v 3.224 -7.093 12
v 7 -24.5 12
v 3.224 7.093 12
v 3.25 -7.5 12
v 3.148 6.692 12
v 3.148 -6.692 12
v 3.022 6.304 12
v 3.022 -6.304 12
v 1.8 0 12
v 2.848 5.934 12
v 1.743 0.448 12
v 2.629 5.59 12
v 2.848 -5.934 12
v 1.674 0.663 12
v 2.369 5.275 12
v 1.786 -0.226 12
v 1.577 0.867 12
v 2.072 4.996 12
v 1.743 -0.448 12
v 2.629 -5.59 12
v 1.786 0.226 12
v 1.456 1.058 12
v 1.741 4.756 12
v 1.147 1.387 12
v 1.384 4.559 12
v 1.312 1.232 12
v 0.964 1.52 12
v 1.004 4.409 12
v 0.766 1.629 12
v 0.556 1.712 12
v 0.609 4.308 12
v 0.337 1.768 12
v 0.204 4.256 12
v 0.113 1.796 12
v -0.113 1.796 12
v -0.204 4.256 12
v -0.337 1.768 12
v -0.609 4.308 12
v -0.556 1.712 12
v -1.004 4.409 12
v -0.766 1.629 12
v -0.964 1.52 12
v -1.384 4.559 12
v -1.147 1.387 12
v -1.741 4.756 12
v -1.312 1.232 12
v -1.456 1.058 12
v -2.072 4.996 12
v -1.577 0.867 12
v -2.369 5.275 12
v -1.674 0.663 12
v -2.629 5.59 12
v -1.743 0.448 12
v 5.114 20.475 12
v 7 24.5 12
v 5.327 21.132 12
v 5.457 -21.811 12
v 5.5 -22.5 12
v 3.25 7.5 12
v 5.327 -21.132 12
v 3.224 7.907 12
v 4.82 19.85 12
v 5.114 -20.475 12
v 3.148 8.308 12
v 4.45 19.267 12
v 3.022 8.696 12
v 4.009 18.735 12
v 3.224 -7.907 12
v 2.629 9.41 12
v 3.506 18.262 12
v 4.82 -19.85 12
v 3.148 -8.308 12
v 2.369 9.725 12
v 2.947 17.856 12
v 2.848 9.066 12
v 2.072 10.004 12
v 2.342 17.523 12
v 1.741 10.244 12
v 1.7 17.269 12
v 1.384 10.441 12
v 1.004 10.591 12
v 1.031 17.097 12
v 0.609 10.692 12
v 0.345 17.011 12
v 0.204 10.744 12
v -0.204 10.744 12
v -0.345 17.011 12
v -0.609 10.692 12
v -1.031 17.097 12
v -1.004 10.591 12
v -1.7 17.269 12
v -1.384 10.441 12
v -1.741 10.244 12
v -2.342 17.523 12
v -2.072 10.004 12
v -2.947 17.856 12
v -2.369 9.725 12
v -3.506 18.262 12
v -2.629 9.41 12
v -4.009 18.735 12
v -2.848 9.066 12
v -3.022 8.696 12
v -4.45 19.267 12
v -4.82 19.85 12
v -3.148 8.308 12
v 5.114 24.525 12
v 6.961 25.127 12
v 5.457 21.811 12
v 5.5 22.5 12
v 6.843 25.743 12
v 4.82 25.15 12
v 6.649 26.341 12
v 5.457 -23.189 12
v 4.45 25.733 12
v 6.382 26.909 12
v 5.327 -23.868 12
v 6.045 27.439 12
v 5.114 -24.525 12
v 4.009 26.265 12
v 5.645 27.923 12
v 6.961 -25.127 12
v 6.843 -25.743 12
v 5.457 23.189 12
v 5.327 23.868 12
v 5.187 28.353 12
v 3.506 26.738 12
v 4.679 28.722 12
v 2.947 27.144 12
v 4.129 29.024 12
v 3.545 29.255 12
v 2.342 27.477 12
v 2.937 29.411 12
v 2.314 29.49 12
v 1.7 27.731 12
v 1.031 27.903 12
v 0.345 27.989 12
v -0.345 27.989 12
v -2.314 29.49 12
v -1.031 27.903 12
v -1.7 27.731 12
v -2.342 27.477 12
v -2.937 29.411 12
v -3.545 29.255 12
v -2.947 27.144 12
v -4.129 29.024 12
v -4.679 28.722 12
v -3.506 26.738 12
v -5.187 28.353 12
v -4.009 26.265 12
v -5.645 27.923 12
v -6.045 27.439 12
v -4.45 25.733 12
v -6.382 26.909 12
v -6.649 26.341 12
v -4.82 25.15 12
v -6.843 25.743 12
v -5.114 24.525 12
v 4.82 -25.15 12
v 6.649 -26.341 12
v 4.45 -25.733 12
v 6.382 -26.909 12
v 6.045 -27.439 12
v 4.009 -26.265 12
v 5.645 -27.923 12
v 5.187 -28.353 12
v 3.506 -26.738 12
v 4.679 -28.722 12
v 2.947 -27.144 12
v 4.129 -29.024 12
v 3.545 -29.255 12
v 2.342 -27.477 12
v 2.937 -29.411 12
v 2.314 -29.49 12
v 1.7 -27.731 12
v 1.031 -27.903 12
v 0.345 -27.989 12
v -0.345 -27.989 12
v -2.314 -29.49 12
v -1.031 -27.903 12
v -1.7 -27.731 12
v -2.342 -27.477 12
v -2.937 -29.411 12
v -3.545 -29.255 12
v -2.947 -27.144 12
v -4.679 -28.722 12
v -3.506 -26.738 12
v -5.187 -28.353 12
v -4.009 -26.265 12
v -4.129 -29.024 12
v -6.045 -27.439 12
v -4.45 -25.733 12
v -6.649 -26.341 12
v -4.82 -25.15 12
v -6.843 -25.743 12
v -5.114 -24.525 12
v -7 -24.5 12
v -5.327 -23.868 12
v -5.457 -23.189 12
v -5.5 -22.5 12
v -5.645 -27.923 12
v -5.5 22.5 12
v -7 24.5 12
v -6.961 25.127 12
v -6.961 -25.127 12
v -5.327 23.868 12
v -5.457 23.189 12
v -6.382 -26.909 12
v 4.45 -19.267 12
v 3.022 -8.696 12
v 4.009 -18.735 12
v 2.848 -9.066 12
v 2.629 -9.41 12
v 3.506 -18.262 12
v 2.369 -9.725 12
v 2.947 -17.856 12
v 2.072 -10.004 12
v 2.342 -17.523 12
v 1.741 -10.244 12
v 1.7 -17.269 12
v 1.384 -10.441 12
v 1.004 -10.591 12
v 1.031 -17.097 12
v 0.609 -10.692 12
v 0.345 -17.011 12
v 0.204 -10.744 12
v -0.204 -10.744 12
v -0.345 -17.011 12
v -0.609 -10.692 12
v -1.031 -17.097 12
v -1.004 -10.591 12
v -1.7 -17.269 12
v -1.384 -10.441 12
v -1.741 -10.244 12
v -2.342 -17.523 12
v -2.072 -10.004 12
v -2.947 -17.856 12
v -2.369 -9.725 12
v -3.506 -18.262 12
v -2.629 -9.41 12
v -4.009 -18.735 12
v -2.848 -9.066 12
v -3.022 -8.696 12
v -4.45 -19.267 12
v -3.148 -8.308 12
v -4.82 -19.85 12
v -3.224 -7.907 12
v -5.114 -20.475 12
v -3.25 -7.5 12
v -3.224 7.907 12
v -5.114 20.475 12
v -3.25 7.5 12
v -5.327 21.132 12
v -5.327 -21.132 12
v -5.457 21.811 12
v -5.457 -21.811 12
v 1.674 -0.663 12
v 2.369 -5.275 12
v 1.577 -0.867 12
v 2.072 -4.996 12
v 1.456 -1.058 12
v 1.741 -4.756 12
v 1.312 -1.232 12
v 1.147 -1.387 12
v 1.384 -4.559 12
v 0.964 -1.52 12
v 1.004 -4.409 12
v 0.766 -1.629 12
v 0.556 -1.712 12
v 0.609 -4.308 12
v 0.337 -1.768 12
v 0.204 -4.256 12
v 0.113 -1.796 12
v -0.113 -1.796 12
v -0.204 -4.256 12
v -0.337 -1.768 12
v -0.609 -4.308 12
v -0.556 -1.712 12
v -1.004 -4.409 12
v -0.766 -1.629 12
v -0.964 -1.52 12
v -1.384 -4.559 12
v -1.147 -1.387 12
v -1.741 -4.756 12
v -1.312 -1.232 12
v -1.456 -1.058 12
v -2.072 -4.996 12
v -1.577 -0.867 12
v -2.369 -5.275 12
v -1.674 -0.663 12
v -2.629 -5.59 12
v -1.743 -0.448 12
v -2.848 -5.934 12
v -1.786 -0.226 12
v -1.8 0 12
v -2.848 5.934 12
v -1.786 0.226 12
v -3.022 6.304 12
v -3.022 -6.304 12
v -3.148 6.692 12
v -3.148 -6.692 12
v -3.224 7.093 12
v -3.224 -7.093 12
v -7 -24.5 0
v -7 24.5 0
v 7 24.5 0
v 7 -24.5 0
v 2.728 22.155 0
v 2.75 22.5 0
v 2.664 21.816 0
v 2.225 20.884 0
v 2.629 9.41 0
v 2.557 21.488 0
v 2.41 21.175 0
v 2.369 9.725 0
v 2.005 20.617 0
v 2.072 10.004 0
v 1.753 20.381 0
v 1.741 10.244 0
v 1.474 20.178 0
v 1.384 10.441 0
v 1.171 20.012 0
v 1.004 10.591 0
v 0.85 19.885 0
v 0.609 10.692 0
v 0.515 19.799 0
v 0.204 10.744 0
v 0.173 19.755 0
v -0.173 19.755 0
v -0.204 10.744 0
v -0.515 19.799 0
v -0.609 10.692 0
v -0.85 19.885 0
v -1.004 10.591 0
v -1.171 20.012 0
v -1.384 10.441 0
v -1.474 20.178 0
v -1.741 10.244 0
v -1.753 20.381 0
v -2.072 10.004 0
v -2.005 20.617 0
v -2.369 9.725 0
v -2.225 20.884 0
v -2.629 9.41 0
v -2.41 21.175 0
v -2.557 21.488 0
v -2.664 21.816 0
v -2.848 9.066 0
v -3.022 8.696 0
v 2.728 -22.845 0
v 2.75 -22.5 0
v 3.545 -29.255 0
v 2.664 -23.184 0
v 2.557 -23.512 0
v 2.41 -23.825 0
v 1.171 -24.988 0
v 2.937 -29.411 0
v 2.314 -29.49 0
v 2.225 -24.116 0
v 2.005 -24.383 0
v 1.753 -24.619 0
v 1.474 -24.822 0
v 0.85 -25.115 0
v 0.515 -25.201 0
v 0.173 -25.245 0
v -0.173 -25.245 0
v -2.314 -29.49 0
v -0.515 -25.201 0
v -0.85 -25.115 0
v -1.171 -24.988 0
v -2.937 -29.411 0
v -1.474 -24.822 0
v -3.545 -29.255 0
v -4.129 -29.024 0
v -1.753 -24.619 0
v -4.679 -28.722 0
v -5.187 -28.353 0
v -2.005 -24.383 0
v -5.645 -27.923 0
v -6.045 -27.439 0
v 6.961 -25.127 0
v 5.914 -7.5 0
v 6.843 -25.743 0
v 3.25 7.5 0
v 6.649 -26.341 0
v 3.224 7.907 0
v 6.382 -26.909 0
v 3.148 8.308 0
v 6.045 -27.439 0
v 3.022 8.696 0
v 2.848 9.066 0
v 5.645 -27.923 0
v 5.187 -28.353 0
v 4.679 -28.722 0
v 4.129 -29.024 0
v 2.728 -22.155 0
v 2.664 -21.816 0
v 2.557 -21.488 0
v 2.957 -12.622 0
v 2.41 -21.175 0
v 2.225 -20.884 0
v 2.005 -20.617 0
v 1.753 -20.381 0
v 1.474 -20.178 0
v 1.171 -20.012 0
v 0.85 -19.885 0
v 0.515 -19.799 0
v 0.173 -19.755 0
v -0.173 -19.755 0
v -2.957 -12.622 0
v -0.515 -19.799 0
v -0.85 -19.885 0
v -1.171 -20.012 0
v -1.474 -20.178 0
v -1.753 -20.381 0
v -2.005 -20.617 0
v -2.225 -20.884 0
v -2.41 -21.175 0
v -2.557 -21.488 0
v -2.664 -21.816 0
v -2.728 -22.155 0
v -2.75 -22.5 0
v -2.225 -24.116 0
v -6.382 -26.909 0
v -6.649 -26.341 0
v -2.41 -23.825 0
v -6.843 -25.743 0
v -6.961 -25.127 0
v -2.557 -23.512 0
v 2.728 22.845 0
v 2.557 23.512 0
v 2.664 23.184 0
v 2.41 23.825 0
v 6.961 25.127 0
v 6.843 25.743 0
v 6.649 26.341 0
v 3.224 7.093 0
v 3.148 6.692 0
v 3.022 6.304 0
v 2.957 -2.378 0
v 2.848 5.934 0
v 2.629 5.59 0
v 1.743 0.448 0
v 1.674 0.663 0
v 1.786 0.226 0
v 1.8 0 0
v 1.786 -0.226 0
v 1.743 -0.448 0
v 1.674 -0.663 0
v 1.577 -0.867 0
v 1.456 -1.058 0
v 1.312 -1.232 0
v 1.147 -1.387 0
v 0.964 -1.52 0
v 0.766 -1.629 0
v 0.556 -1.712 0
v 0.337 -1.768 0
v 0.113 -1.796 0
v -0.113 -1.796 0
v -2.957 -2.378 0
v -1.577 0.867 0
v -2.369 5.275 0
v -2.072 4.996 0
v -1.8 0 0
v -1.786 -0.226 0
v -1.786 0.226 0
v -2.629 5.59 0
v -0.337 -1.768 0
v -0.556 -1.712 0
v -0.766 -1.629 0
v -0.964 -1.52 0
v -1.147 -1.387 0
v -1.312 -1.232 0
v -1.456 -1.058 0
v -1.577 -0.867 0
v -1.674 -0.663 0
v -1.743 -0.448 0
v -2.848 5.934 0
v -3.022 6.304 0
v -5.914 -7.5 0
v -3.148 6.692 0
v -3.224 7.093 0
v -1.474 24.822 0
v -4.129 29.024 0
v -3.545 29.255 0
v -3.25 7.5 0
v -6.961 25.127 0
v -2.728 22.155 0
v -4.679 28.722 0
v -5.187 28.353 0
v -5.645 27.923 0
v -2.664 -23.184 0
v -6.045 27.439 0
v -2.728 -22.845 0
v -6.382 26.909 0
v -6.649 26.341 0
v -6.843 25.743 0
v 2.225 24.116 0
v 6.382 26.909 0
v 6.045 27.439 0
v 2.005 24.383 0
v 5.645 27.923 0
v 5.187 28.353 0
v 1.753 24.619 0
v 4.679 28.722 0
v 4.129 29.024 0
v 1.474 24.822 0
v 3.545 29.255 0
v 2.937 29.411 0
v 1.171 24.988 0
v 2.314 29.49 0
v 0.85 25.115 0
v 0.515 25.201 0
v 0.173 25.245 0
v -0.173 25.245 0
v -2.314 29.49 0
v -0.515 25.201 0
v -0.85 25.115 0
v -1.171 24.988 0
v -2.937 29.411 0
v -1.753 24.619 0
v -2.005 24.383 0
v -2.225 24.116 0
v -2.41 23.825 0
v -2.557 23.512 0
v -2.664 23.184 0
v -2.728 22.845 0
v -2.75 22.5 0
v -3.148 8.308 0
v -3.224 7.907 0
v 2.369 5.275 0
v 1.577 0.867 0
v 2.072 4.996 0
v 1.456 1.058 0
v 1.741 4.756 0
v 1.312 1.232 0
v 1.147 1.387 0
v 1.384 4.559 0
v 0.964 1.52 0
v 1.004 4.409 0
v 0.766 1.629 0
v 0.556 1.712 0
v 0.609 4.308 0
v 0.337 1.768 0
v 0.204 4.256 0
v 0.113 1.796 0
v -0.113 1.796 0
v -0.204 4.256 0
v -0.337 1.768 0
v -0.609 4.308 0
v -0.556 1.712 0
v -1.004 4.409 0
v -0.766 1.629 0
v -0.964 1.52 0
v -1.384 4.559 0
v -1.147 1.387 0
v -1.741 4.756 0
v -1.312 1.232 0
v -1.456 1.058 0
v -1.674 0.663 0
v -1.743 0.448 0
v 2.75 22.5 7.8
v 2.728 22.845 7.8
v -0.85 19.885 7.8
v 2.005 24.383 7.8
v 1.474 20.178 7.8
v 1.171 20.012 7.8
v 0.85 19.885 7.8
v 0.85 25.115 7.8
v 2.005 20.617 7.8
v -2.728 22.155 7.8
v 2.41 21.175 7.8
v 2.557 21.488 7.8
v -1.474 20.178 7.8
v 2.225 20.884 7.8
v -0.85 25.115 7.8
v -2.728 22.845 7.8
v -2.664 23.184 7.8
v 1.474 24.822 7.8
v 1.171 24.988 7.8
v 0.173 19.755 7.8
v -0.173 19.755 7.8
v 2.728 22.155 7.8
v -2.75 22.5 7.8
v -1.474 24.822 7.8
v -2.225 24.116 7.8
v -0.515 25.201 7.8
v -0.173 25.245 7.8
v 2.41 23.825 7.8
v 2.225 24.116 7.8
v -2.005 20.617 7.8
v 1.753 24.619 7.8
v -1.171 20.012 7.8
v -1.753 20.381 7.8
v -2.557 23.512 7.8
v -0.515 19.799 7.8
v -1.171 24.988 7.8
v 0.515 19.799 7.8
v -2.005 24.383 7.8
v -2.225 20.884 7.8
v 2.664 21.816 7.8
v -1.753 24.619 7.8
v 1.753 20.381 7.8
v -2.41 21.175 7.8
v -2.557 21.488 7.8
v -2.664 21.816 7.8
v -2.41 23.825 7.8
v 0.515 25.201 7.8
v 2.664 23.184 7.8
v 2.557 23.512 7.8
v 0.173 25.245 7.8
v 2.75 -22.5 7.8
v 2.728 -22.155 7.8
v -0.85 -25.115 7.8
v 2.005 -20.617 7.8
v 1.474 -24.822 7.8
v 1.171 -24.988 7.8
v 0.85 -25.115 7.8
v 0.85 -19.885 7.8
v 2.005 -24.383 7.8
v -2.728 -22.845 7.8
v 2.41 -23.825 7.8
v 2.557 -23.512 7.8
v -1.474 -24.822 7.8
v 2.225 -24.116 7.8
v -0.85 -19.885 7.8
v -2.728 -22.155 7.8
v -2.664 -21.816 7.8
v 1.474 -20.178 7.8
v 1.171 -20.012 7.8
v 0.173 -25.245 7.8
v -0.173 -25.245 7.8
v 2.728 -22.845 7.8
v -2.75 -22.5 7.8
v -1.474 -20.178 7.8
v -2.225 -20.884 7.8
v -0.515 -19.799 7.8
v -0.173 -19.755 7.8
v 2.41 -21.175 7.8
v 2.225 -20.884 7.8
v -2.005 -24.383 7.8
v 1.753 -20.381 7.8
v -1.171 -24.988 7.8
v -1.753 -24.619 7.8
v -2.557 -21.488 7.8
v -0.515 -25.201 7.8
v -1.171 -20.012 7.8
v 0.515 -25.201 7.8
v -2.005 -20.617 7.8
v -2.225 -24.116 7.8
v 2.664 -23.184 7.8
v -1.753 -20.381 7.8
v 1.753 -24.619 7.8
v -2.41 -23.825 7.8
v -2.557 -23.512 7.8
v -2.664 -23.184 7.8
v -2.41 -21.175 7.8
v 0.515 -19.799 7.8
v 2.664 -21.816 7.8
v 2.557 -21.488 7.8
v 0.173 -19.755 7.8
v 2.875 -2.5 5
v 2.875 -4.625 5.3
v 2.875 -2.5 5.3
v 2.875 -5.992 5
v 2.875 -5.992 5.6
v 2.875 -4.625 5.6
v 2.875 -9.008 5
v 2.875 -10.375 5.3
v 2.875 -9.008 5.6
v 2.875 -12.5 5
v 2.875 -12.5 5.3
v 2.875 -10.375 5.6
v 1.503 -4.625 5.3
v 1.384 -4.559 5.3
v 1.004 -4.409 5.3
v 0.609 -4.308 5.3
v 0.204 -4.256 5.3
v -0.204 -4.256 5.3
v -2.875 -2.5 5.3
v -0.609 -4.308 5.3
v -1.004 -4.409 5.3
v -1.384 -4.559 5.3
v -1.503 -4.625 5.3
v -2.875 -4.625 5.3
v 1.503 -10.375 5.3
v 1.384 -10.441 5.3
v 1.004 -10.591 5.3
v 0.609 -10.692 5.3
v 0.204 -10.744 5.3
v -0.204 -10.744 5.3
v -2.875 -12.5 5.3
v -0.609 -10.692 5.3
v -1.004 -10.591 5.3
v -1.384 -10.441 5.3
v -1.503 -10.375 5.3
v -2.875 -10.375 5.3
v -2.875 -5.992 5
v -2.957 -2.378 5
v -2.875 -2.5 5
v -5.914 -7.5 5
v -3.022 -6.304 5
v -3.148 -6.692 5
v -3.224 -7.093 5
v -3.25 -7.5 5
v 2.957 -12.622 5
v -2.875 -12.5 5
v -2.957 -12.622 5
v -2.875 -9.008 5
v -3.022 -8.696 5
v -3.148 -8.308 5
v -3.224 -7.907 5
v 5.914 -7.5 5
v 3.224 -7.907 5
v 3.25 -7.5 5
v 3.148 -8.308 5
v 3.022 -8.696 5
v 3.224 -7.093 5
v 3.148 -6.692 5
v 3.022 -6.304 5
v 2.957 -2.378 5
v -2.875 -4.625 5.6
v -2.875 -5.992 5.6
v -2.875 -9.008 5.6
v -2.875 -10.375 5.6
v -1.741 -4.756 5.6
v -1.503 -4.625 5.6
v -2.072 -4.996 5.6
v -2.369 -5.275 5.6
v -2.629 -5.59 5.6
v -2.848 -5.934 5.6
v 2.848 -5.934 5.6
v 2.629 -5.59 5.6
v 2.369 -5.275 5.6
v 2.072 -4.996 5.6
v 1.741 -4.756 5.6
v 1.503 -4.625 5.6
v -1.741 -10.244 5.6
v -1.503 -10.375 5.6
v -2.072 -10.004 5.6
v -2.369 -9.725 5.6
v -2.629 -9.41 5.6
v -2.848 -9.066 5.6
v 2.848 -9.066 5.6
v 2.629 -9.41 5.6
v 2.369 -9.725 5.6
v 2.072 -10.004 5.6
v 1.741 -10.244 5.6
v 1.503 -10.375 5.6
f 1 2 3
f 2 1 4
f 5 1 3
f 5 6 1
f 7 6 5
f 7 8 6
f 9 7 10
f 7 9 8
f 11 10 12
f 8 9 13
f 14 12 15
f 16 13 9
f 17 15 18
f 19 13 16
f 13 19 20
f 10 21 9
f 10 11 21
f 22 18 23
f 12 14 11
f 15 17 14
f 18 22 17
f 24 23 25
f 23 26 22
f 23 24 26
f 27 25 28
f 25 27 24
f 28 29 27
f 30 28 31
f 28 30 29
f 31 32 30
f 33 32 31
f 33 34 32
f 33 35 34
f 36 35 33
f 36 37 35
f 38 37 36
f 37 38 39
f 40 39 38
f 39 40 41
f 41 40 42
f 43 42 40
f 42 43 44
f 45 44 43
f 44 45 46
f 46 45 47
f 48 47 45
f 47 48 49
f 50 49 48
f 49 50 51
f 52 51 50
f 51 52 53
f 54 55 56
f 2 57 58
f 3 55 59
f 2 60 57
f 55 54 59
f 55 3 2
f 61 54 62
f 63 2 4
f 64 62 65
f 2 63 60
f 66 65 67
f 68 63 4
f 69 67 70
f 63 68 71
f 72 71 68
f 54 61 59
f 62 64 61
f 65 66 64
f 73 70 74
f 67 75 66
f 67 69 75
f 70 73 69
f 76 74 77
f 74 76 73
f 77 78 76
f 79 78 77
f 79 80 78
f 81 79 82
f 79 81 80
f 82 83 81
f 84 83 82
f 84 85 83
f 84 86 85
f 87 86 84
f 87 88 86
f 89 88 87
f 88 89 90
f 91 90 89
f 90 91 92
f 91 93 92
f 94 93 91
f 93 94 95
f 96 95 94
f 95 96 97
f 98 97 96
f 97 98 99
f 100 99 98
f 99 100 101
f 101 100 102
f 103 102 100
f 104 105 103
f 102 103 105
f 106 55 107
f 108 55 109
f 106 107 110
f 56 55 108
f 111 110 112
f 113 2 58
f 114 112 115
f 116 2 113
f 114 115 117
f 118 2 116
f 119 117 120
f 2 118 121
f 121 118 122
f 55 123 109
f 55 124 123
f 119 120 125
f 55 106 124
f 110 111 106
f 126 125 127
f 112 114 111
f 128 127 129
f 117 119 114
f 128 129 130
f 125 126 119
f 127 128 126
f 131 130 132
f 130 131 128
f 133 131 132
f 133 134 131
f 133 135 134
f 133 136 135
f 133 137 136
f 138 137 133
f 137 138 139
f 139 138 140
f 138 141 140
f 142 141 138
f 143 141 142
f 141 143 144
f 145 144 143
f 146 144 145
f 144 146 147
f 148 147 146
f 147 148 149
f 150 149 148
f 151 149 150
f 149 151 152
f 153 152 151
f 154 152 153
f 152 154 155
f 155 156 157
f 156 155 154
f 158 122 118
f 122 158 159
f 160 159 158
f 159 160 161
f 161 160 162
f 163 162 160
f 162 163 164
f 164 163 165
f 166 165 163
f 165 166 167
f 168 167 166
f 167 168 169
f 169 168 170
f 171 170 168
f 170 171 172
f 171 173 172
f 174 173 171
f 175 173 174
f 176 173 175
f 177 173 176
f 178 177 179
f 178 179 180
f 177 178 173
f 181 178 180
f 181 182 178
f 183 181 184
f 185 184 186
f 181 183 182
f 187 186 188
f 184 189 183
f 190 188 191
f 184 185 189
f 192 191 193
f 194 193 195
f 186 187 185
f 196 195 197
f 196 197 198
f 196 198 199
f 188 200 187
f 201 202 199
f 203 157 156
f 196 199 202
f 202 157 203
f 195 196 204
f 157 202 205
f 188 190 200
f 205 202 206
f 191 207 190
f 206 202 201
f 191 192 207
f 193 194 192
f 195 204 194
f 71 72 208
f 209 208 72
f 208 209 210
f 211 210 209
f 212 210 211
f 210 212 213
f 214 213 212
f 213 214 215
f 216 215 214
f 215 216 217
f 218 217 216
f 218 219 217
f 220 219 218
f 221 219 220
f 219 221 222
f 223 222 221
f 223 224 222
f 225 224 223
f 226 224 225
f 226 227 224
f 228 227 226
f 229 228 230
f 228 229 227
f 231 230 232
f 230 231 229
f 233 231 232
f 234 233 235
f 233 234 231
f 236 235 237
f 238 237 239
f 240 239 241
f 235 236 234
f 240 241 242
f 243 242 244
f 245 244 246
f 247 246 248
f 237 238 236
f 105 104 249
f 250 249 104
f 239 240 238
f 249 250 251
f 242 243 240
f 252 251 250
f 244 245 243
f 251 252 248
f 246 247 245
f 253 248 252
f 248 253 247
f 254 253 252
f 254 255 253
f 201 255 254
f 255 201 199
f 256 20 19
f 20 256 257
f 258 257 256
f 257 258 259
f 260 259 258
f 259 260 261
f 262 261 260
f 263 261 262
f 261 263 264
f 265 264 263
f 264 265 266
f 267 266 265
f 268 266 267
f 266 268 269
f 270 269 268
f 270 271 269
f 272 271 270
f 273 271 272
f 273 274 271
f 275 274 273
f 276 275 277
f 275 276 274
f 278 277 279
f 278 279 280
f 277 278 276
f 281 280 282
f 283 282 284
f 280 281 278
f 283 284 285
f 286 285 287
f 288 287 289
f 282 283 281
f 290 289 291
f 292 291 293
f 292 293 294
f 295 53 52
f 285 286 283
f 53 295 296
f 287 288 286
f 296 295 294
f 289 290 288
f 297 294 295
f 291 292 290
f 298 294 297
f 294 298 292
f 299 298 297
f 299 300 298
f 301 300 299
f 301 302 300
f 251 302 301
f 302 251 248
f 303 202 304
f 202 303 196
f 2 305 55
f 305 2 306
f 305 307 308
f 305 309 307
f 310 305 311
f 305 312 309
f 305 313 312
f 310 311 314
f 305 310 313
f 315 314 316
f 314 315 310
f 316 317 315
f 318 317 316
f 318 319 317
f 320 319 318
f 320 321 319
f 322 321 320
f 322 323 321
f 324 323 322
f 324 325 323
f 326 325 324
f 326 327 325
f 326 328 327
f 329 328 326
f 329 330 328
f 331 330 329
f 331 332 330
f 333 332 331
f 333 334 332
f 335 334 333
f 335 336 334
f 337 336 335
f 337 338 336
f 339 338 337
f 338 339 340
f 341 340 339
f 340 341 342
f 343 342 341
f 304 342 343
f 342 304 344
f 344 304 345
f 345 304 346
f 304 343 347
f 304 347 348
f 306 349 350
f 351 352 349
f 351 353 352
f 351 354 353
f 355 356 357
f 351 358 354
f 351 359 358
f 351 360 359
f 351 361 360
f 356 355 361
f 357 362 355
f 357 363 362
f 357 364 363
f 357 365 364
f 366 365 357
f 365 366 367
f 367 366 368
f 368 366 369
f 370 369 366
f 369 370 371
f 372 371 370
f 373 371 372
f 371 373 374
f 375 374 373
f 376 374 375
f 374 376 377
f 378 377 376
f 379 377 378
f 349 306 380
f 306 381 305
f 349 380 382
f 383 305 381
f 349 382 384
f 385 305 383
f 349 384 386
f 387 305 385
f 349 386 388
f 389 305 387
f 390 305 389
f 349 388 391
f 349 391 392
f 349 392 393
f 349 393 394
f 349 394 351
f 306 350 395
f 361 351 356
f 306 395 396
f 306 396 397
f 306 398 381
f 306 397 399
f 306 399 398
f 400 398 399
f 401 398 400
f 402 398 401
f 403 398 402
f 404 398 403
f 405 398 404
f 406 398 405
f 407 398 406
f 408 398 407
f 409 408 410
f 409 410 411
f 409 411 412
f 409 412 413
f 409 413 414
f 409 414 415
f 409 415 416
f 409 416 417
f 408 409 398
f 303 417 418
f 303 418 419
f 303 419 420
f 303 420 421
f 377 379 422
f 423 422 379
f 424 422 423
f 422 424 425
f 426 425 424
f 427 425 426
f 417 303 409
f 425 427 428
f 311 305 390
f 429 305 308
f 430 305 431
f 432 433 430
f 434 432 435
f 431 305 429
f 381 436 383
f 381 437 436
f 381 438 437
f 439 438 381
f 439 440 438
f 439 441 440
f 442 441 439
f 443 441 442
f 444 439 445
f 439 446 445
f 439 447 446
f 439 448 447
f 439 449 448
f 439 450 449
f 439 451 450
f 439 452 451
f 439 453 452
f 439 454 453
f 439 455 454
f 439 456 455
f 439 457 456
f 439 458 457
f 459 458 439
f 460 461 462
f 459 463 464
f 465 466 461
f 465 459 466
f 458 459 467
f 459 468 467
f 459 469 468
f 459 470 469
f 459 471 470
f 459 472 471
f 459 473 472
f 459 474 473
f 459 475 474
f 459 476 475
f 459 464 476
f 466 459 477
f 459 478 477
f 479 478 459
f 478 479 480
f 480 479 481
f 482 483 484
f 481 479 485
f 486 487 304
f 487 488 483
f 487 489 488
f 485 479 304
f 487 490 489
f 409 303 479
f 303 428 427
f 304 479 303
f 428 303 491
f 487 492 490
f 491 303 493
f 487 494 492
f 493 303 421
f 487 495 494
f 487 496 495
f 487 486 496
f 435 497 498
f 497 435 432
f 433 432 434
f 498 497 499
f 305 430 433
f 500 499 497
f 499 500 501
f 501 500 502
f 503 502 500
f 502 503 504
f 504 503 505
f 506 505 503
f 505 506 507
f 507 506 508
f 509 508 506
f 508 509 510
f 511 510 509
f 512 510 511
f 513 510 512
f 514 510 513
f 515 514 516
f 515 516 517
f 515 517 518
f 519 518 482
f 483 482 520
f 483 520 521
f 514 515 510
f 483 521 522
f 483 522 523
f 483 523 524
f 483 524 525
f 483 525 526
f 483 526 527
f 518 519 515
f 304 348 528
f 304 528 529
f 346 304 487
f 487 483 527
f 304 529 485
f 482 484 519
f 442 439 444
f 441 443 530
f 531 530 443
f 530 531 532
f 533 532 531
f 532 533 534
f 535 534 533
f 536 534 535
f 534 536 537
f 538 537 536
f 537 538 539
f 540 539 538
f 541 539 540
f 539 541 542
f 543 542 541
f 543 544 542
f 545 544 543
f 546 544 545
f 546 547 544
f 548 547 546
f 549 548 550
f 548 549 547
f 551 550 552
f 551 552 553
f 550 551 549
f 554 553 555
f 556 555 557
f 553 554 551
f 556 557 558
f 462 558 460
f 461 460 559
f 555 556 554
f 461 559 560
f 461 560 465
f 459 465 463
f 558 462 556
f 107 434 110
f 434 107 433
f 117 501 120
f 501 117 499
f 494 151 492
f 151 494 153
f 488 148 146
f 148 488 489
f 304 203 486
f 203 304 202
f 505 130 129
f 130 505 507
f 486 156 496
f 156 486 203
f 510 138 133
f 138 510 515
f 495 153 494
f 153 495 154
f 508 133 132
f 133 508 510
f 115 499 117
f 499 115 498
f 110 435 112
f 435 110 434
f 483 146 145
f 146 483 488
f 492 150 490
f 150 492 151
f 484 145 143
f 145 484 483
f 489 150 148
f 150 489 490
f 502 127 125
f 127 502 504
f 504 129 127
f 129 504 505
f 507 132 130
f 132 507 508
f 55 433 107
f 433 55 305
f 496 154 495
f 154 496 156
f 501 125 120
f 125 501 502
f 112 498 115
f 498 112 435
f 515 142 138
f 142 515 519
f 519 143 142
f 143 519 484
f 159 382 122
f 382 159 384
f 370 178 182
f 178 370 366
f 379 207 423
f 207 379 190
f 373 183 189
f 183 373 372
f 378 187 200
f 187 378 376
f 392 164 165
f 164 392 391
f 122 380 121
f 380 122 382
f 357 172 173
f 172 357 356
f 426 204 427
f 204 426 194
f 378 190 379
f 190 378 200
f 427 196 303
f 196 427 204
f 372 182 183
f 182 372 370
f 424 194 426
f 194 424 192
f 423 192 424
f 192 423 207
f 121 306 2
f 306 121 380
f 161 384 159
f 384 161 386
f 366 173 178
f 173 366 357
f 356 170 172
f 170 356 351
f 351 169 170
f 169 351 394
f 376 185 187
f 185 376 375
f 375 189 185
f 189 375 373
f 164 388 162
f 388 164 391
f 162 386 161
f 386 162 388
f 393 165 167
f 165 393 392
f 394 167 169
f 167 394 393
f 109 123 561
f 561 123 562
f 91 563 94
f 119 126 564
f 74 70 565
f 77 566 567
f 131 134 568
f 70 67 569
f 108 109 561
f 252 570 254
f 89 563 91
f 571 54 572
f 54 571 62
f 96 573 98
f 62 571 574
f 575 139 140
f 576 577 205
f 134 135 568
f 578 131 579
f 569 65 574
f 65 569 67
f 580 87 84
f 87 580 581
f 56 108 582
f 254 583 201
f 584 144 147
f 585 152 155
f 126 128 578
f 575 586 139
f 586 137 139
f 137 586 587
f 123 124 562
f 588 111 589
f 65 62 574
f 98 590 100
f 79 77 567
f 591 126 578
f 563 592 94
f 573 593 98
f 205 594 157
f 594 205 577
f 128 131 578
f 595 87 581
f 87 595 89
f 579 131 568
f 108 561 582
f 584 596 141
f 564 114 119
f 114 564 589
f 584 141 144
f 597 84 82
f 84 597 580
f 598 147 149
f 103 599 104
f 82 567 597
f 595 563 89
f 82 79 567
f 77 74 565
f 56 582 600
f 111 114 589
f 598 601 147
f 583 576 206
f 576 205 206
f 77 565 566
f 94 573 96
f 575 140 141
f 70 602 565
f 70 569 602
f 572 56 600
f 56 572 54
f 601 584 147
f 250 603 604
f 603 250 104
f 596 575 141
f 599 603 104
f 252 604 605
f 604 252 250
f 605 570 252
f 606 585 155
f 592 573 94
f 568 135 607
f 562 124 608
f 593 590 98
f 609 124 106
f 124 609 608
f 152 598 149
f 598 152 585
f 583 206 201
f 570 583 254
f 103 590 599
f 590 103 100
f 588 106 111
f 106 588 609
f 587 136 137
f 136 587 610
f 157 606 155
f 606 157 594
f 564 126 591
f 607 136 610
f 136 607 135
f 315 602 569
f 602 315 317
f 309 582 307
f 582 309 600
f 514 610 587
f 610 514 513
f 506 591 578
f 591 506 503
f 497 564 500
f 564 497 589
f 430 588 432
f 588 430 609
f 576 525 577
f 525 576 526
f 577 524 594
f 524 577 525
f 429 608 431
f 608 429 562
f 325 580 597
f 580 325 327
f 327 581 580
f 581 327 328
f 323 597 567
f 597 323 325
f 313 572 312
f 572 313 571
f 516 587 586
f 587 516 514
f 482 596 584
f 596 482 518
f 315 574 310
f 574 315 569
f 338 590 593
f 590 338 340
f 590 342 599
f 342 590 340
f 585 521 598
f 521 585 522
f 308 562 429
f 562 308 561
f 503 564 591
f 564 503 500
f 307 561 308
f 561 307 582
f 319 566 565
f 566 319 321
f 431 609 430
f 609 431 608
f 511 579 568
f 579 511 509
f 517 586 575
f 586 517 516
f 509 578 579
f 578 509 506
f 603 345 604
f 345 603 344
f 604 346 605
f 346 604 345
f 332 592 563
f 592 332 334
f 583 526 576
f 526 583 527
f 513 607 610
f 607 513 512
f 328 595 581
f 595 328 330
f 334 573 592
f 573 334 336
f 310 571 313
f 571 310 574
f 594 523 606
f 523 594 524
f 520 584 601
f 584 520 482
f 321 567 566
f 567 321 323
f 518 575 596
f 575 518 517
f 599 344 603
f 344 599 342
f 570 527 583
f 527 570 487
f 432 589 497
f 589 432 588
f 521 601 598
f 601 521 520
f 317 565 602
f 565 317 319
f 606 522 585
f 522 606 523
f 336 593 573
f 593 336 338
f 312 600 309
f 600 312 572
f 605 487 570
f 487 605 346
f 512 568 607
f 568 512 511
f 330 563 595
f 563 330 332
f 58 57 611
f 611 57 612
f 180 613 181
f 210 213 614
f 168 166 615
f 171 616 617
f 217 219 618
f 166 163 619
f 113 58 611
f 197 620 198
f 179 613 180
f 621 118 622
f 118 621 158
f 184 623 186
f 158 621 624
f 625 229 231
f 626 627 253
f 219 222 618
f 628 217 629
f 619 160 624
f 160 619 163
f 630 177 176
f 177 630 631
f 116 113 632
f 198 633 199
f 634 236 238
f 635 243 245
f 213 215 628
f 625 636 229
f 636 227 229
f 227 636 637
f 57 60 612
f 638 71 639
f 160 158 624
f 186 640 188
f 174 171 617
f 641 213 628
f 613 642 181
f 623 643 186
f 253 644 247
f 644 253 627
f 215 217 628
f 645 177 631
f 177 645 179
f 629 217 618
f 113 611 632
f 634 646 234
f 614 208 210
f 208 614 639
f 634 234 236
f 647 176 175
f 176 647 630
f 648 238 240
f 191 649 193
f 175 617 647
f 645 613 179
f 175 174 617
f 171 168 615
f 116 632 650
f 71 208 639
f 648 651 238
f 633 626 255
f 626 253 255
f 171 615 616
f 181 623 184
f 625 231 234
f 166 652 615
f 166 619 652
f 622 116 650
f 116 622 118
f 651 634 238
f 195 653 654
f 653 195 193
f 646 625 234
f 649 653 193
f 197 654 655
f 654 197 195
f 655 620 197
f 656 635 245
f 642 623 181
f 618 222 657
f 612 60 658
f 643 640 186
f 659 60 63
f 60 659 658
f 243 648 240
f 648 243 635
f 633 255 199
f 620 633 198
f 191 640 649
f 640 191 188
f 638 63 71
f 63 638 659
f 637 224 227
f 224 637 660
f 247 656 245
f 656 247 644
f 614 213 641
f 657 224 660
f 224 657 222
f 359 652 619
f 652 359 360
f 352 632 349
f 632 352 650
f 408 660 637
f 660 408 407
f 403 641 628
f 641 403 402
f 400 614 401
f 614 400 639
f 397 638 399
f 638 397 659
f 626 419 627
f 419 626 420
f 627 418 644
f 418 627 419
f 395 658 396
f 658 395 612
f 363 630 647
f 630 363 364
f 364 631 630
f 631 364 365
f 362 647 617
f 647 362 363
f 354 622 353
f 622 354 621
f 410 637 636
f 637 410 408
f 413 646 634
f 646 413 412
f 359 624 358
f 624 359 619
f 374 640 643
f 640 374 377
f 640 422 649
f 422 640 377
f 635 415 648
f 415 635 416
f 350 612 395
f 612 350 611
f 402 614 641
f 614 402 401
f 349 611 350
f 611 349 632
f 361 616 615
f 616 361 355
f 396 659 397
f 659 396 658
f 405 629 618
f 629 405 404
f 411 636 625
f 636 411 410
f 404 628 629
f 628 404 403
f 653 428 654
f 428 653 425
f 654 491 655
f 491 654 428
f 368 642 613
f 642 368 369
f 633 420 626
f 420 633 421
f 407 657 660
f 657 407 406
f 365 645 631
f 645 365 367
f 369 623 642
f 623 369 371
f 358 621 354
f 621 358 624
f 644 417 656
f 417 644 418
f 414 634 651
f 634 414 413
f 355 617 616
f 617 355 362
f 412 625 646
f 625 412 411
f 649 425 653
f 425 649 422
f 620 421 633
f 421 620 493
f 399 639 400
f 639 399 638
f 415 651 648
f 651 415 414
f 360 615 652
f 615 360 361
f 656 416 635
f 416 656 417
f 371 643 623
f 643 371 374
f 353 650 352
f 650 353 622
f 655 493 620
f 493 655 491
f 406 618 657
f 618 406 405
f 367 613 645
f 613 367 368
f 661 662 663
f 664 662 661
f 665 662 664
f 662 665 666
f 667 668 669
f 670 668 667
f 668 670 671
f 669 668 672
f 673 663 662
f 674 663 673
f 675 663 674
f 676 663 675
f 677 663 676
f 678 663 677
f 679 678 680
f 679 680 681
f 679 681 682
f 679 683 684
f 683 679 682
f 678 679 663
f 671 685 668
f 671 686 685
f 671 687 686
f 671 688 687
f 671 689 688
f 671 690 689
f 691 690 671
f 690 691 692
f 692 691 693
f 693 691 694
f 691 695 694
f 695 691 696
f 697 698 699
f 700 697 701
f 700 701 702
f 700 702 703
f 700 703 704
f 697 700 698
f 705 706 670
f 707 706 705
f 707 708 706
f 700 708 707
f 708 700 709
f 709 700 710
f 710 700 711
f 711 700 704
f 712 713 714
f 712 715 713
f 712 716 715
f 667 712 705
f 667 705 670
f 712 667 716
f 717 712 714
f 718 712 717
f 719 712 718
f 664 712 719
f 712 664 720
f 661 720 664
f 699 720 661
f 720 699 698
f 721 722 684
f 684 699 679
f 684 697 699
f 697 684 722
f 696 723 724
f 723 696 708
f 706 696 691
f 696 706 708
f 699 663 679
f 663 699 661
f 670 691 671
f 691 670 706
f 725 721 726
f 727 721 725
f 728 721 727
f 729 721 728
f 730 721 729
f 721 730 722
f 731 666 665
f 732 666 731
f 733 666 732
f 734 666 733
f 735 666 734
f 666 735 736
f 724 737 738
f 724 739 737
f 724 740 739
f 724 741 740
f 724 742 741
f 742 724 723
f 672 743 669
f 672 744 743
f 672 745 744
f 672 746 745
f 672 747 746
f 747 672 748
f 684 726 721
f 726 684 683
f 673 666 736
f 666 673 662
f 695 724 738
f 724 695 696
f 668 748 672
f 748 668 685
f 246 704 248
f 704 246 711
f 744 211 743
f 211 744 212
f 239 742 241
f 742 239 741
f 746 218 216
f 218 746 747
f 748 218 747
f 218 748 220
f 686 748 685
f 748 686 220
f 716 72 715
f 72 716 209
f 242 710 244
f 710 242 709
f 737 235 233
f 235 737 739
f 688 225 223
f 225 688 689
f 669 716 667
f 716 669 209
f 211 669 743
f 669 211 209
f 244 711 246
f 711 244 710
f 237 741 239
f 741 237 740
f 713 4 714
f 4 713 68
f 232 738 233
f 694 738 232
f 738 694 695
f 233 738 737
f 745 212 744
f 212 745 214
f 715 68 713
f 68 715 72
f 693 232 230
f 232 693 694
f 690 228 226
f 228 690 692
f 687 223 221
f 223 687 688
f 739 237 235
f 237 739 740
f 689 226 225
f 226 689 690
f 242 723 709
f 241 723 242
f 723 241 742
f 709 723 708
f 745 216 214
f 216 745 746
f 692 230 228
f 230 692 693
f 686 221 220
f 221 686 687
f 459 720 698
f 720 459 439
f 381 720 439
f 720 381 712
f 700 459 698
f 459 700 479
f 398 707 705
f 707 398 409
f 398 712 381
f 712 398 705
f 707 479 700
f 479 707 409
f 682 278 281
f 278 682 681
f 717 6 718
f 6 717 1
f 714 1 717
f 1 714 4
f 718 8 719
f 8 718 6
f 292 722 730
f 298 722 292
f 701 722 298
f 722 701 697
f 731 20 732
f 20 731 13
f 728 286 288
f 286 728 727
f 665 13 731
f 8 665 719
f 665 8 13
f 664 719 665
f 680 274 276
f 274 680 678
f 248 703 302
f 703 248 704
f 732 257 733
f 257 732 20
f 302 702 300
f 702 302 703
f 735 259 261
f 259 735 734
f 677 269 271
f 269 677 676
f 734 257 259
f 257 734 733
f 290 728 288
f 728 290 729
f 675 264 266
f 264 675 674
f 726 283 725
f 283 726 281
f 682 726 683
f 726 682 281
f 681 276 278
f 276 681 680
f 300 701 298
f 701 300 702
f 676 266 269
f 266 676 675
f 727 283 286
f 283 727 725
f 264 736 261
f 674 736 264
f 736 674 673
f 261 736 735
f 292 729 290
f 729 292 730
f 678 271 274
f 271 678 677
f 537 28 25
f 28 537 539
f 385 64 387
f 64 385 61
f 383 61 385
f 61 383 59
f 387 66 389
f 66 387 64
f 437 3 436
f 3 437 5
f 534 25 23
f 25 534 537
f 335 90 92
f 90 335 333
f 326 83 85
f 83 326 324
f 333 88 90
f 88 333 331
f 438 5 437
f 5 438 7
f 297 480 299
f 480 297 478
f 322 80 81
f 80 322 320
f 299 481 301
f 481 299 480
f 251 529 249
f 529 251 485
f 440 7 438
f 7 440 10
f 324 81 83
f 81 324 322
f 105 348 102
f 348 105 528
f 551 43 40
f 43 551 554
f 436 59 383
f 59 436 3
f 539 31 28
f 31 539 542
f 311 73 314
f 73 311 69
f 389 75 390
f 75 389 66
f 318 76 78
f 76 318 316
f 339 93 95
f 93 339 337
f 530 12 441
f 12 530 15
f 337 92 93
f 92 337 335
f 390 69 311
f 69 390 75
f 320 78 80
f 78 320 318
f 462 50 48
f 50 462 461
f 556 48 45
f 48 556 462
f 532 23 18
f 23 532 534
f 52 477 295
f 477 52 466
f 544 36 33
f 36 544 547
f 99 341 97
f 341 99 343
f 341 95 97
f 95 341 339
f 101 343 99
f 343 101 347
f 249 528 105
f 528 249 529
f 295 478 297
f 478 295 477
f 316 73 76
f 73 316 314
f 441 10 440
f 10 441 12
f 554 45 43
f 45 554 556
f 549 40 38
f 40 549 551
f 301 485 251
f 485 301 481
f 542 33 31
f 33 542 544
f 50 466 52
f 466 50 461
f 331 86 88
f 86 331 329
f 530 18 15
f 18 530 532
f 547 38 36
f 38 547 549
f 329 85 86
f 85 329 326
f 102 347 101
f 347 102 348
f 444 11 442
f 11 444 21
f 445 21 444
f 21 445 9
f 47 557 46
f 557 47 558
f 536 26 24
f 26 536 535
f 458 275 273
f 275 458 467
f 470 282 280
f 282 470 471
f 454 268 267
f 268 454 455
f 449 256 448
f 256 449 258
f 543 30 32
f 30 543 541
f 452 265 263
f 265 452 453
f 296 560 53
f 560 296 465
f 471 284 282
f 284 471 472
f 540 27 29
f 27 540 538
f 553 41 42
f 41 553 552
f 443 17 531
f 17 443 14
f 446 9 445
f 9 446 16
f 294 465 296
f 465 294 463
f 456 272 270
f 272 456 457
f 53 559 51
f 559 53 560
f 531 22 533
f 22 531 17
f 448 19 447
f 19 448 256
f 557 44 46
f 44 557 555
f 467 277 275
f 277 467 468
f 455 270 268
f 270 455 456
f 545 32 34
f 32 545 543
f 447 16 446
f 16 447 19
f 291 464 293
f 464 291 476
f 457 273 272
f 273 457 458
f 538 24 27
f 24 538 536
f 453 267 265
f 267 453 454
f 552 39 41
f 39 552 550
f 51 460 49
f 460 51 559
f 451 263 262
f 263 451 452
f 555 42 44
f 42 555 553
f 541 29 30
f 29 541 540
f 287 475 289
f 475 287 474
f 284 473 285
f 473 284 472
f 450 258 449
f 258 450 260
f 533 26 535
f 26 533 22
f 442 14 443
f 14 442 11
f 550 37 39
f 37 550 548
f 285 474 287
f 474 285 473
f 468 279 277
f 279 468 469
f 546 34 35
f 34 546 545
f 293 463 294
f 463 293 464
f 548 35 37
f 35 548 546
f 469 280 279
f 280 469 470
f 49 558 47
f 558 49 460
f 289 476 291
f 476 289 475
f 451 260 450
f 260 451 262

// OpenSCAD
$fn = 50;


difference() {
	union() {
		hull() {
			translate(v = [-2.0000000000, 9.5000000000, 0]) {
				cylinder(h = 12, r = 5);
			}
			translate(v = [2.0000000000, 9.5000000000, 0]) {
				cylinder(h = 12, r = 5);
			}
			translate(v = [-2.0000000000, -9.5000000000, 0]) {
				cylinder(h = 12, r = 5);
			}
			translate(v = [2.0000000000, -9.5000000000, 0]) {
				cylinder(h = 12, r = 5);
			}
		}
		translate(v = [0.0000000000, 15.0000000000, 0]) {
			hull() {
				translate(v = [-2.0000000000, 9.5000000000, 0]) {
					cylinder(h = 12, r = 5);
				}
				translate(v = [2.0000000000, 9.5000000000, 0]) {
					cylinder(h = 12, r = 5);
				}
				translate(v = [-2.0000000000, -9.5000000000, 0]) {
					cylinder(h = 12, r = 5);
				}
				translate(v = [2.0000000000, -9.5000000000, 0]) {
					cylinder(h = 12, r = 5);
				}
			}
		}
		translate(v = [0.0000000000, 15.0000000000, 0]) {
			hull() {
				translate(v = [-2.0000000000, 9.5000000000, 0]) {
					cylinder(h = 12, r = 5);
				}
				translate(v = [2.0000000000, 9.5000000000, 0]) {
					cylinder(h = 12, r = 5);
				}
				translate(v = [-2.0000000000, -9.5000000000, 0]) {
					cylinder(h = 12, r = 5);
				}
				translate(v = [2.0000000000, -9.5000000000, 0]) {
					cylinder(h = 12, r = 5);
				}
			}
		}
		translate(v = [0.0000000000, -15.0000000000, 0]) {
			hull() {
				translate(v = [-2.0000000000, 9.5000000000, 0]) {
					cylinder(h = 12, r = 5);
				}
				translate(v = [2.0000000000, 9.5000000000, 0]) {
					cylinder(h = 12, r = 5);
				}
				translate(v = [-2.0000000000, -9.5000000000, 0]) {
					cylinder(h = 12, r = 5);
				}
				translate(v = [2.0000000000, -9.5000000000, 0]) {
					cylinder(h = 12, r = 5);
				}
			}
		}
		translate(v = [0.0000000000, -15.0000000000, 0]) {
			hull() {
				translate(v = [-2.0000000000, 9.5000000000, 0]) {
					cylinder(h = 12, r = 5);
				}
				translate(v = [2.0000000000, 9.5000000000, 0]) {
					cylinder(h = 12, r = 5);
				}
				translate(v = [-2.0000000000, -9.5000000000, 0]) {
					cylinder(h = 12, r = 5);
				}
				translate(v = [2.0000000000, -9.5000000000, 0]) {
					cylinder(h = 12, r = 5);
				}
			}
		}
	}
	union() {
		translate(v = [0.0000000000, 22.5000000000, 12]) {
			rotate(a = [0, 0, 0]) {
				difference() {
					union() {
						#translate(v = [0, 0, -12.0000000000]) {
							cylinder(h = 12, r = 2.2500000000);
						}
						#translate(v = [0, 0, -4.2000000000]) {
							cylinder(h = 4.2000000000, r1 = 2.7500000000, r2 = 5.5000000000);
						}
						#translate(v = [0, 0, -12.0000000000]) {
							cylinder(h = 12, r = 2.7500000000);
						}
						#translate(v = [0, 0, -12.0000000000]) {
							cylinder(h = 12, r = 2.2500000000);
						}
					}
					union();
				}
			}
		}
		translate(v = [0.0000000000, 22.5000000000, 12]) {
			rotate(a = [0, 0, 0]) {
				difference() {
					union() {
						#translate(v = [0, 0, -12.0000000000]) {
							cylinder(h = 12, r = 2.2500000000);
						}
						#translate(v = [0, 0, -4.2000000000]) {
							cylinder(h = 4.2000000000, r1 = 2.7500000000, r2 = 5.5000000000);
						}
						#translate(v = [0, 0, -12.0000000000]) {
							cylinder(h = 12, r = 2.7500000000);
						}
						#translate(v = [0, 0, -12.0000000000]) {
							cylinder(h = 12, r = 2.2500000000);
						}
					}
					union();
				}
			}
		}
		translate(v = [0.0000000000, -22.5000000000, 12]) {
			rotate(a = [0, 0, 0]) {
				difference() {
					union() {
						#translate(v = [0, 0, -12.0000000000]) {
							cylinder(h = 12, r = 2.2500000000);
						}
						#translate(v = [0, 0, -4.2000000000]) {
							cylinder(h = 4.2000000000, r1 = 2.7500000000, r2 = 5.5000000000);
						}
						#translate(v = [0, 0, -12.0000000000]) {
							cylinder(h = 12, r = 2.7500000000);
						}
						#translate(v = [0, 0, -12.0000000000]) {
							cylinder(h = 12, r = 2.2500000000);
						}
					}
					union();
				}
			}
		}
		translate(v = [0.0000000000, -22.5000000000, 12]) {
			rotate(a = [0, 0, 0]) {
				difference() {
					union() {
						#translate(v = [0, 0, -12.0000000000]) {
							cylinder(h = 12, r = 2.2500000000);
						}
						#translate(v = [0, 0, -4.2000000000]) {
							cylinder(h = 4.2000000000, r1 = 2.7500000000, r2 = 5.5000000000);
						}
						#translate(v = [0, 0, -12.0000000000]) {
							cylinder(h = 12, r = 2.7500000000);
						}
						#translate(v = [0, 0, -12.0000000000]) {
							cylinder(h = 12, r = 2.2500000000);
						}
					}
					union();
				}
			}
		}
		translate(v = [0.0000000000, -7.5000000000, 0]) {
			rotate(a = [0, 0, 0]) {
				difference() {
					union() {
						#translate(v = [-2.8750000000, -5.0000000000, -0.3000000000]) {
							cube(size = [5.7500000000, 10, 0.3000000000]);
						}
						#translate(v = [-2.8750000000, -2.8750000000, -0.6000000000]) {
							cube(size = [5.7500000000, 5.7500000000, 0.3000000000]);
						}
						#translate(v = [-2.8750000000, -5.0000000000, 5]) {
							cube(size = [5.7500000000, 10, 0.3000000000]);
						}
						#translate(v = [-2.8750000000, -2.8750000000, 5.3000000000]) {
							cube(size = [5.7500000000, 5.7500000000, 0.3000000000]);
						}
						#translate(v = [0, 0, -100.0000000000]) {
							cylinder(h = 200, r = 3.2500000000);
						}
						#linear_extrude(height = 5) {
							polygon(points = [[5.9142500000, 0.0000000000], [2.9571250000, 5.1218907443], [-2.9571250000, 5.1218907443], [-5.9142500000, 0.0000000000], [-2.9571250000, -5.1218907443], [2.9571250000, -5.1218907443]]);
						}
						#translate(v = [-2.8750000000, -5.0000000000, -0.3000000000]) {
							cube(size = [5.7500000000, 10, 0.3000000000]);
						}
						#translate(v = [-2.8750000000, -2.8750000000, -0.6000000000]) {
							cube(size = [5.7500000000, 5.7500000000, 0.3000000000]);
						}
						#translate(v = [-2.8750000000, -5.0000000000, 5]) {
							cube(size = [5.7500000000, 10, 0.3000000000]);
						}
						#translate(v = [-2.8750000000, -2.8750000000, 5.3000000000]) {
							cube(size = [5.7500000000, 5.7500000000, 0.3000000000]);
						}
						#translate(v = [0, 0, -100.0000000000]) {
							cylinder(h = 200, r = 3.2500000000);
						}
						#translate(v = [-2.8750000000, -5.0000000000, -0.3000000000]) {
							cube(size = [5.7500000000, 10, 0.3000000000]);
						}
						#translate(v = [-2.8750000000, -2.8750000000, -0.6000000000]) {
							cube(size = [5.7500000000, 5.7500000000, 0.3000000000]);
						}
						#translate(v = [-2.8750000000, -5.0000000000, 5]) {
							cube(size = [5.7500000000, 10, 0.3000000000]);
						}
						#translate(v = [-2.8750000000, -2.8750000000, 5.3000000000]) {
							cube(size = [5.7500000000, 5.7500000000, 0.3000000000]);
						}
						#translate(v = [0, 0, -100.0000000000]) {
							cylinder(h = 200, r = 3.2500000000);
						}
					}
					union();
				}
			}
		}
		translate(v = [0.0000000000, -7.5000000000, 0]) {
			translate(v = [0, 0, -100]) {
				cylinder(h = 200, r = 3.2500000000);
			}
		}
		translate(v = [0.0000000000, 7.5000000000, 0]) {
			translate(v = [0, 0, -100]) {
				cylinder(h = 200, r = 3.2500000000);
			}
		}
		translate(v = [0.0000000000, -7.5000000000, 0]) {
			translate(v = [0, 0, -100]) {
				cylinder(h = 200, r = 1.8000000000);
			}
		}
		translate(v = [0, 0, -100]) {
			cylinder(h = 200, r = 1.8000000000);
		}
		translate(v = [0.0000000000, 7.5000000000, 0]) {
			translate(v = [0, 0, -100]) {
				cylinder(h = 200, r = 1.8000000000);
			}
		}
	}
}
